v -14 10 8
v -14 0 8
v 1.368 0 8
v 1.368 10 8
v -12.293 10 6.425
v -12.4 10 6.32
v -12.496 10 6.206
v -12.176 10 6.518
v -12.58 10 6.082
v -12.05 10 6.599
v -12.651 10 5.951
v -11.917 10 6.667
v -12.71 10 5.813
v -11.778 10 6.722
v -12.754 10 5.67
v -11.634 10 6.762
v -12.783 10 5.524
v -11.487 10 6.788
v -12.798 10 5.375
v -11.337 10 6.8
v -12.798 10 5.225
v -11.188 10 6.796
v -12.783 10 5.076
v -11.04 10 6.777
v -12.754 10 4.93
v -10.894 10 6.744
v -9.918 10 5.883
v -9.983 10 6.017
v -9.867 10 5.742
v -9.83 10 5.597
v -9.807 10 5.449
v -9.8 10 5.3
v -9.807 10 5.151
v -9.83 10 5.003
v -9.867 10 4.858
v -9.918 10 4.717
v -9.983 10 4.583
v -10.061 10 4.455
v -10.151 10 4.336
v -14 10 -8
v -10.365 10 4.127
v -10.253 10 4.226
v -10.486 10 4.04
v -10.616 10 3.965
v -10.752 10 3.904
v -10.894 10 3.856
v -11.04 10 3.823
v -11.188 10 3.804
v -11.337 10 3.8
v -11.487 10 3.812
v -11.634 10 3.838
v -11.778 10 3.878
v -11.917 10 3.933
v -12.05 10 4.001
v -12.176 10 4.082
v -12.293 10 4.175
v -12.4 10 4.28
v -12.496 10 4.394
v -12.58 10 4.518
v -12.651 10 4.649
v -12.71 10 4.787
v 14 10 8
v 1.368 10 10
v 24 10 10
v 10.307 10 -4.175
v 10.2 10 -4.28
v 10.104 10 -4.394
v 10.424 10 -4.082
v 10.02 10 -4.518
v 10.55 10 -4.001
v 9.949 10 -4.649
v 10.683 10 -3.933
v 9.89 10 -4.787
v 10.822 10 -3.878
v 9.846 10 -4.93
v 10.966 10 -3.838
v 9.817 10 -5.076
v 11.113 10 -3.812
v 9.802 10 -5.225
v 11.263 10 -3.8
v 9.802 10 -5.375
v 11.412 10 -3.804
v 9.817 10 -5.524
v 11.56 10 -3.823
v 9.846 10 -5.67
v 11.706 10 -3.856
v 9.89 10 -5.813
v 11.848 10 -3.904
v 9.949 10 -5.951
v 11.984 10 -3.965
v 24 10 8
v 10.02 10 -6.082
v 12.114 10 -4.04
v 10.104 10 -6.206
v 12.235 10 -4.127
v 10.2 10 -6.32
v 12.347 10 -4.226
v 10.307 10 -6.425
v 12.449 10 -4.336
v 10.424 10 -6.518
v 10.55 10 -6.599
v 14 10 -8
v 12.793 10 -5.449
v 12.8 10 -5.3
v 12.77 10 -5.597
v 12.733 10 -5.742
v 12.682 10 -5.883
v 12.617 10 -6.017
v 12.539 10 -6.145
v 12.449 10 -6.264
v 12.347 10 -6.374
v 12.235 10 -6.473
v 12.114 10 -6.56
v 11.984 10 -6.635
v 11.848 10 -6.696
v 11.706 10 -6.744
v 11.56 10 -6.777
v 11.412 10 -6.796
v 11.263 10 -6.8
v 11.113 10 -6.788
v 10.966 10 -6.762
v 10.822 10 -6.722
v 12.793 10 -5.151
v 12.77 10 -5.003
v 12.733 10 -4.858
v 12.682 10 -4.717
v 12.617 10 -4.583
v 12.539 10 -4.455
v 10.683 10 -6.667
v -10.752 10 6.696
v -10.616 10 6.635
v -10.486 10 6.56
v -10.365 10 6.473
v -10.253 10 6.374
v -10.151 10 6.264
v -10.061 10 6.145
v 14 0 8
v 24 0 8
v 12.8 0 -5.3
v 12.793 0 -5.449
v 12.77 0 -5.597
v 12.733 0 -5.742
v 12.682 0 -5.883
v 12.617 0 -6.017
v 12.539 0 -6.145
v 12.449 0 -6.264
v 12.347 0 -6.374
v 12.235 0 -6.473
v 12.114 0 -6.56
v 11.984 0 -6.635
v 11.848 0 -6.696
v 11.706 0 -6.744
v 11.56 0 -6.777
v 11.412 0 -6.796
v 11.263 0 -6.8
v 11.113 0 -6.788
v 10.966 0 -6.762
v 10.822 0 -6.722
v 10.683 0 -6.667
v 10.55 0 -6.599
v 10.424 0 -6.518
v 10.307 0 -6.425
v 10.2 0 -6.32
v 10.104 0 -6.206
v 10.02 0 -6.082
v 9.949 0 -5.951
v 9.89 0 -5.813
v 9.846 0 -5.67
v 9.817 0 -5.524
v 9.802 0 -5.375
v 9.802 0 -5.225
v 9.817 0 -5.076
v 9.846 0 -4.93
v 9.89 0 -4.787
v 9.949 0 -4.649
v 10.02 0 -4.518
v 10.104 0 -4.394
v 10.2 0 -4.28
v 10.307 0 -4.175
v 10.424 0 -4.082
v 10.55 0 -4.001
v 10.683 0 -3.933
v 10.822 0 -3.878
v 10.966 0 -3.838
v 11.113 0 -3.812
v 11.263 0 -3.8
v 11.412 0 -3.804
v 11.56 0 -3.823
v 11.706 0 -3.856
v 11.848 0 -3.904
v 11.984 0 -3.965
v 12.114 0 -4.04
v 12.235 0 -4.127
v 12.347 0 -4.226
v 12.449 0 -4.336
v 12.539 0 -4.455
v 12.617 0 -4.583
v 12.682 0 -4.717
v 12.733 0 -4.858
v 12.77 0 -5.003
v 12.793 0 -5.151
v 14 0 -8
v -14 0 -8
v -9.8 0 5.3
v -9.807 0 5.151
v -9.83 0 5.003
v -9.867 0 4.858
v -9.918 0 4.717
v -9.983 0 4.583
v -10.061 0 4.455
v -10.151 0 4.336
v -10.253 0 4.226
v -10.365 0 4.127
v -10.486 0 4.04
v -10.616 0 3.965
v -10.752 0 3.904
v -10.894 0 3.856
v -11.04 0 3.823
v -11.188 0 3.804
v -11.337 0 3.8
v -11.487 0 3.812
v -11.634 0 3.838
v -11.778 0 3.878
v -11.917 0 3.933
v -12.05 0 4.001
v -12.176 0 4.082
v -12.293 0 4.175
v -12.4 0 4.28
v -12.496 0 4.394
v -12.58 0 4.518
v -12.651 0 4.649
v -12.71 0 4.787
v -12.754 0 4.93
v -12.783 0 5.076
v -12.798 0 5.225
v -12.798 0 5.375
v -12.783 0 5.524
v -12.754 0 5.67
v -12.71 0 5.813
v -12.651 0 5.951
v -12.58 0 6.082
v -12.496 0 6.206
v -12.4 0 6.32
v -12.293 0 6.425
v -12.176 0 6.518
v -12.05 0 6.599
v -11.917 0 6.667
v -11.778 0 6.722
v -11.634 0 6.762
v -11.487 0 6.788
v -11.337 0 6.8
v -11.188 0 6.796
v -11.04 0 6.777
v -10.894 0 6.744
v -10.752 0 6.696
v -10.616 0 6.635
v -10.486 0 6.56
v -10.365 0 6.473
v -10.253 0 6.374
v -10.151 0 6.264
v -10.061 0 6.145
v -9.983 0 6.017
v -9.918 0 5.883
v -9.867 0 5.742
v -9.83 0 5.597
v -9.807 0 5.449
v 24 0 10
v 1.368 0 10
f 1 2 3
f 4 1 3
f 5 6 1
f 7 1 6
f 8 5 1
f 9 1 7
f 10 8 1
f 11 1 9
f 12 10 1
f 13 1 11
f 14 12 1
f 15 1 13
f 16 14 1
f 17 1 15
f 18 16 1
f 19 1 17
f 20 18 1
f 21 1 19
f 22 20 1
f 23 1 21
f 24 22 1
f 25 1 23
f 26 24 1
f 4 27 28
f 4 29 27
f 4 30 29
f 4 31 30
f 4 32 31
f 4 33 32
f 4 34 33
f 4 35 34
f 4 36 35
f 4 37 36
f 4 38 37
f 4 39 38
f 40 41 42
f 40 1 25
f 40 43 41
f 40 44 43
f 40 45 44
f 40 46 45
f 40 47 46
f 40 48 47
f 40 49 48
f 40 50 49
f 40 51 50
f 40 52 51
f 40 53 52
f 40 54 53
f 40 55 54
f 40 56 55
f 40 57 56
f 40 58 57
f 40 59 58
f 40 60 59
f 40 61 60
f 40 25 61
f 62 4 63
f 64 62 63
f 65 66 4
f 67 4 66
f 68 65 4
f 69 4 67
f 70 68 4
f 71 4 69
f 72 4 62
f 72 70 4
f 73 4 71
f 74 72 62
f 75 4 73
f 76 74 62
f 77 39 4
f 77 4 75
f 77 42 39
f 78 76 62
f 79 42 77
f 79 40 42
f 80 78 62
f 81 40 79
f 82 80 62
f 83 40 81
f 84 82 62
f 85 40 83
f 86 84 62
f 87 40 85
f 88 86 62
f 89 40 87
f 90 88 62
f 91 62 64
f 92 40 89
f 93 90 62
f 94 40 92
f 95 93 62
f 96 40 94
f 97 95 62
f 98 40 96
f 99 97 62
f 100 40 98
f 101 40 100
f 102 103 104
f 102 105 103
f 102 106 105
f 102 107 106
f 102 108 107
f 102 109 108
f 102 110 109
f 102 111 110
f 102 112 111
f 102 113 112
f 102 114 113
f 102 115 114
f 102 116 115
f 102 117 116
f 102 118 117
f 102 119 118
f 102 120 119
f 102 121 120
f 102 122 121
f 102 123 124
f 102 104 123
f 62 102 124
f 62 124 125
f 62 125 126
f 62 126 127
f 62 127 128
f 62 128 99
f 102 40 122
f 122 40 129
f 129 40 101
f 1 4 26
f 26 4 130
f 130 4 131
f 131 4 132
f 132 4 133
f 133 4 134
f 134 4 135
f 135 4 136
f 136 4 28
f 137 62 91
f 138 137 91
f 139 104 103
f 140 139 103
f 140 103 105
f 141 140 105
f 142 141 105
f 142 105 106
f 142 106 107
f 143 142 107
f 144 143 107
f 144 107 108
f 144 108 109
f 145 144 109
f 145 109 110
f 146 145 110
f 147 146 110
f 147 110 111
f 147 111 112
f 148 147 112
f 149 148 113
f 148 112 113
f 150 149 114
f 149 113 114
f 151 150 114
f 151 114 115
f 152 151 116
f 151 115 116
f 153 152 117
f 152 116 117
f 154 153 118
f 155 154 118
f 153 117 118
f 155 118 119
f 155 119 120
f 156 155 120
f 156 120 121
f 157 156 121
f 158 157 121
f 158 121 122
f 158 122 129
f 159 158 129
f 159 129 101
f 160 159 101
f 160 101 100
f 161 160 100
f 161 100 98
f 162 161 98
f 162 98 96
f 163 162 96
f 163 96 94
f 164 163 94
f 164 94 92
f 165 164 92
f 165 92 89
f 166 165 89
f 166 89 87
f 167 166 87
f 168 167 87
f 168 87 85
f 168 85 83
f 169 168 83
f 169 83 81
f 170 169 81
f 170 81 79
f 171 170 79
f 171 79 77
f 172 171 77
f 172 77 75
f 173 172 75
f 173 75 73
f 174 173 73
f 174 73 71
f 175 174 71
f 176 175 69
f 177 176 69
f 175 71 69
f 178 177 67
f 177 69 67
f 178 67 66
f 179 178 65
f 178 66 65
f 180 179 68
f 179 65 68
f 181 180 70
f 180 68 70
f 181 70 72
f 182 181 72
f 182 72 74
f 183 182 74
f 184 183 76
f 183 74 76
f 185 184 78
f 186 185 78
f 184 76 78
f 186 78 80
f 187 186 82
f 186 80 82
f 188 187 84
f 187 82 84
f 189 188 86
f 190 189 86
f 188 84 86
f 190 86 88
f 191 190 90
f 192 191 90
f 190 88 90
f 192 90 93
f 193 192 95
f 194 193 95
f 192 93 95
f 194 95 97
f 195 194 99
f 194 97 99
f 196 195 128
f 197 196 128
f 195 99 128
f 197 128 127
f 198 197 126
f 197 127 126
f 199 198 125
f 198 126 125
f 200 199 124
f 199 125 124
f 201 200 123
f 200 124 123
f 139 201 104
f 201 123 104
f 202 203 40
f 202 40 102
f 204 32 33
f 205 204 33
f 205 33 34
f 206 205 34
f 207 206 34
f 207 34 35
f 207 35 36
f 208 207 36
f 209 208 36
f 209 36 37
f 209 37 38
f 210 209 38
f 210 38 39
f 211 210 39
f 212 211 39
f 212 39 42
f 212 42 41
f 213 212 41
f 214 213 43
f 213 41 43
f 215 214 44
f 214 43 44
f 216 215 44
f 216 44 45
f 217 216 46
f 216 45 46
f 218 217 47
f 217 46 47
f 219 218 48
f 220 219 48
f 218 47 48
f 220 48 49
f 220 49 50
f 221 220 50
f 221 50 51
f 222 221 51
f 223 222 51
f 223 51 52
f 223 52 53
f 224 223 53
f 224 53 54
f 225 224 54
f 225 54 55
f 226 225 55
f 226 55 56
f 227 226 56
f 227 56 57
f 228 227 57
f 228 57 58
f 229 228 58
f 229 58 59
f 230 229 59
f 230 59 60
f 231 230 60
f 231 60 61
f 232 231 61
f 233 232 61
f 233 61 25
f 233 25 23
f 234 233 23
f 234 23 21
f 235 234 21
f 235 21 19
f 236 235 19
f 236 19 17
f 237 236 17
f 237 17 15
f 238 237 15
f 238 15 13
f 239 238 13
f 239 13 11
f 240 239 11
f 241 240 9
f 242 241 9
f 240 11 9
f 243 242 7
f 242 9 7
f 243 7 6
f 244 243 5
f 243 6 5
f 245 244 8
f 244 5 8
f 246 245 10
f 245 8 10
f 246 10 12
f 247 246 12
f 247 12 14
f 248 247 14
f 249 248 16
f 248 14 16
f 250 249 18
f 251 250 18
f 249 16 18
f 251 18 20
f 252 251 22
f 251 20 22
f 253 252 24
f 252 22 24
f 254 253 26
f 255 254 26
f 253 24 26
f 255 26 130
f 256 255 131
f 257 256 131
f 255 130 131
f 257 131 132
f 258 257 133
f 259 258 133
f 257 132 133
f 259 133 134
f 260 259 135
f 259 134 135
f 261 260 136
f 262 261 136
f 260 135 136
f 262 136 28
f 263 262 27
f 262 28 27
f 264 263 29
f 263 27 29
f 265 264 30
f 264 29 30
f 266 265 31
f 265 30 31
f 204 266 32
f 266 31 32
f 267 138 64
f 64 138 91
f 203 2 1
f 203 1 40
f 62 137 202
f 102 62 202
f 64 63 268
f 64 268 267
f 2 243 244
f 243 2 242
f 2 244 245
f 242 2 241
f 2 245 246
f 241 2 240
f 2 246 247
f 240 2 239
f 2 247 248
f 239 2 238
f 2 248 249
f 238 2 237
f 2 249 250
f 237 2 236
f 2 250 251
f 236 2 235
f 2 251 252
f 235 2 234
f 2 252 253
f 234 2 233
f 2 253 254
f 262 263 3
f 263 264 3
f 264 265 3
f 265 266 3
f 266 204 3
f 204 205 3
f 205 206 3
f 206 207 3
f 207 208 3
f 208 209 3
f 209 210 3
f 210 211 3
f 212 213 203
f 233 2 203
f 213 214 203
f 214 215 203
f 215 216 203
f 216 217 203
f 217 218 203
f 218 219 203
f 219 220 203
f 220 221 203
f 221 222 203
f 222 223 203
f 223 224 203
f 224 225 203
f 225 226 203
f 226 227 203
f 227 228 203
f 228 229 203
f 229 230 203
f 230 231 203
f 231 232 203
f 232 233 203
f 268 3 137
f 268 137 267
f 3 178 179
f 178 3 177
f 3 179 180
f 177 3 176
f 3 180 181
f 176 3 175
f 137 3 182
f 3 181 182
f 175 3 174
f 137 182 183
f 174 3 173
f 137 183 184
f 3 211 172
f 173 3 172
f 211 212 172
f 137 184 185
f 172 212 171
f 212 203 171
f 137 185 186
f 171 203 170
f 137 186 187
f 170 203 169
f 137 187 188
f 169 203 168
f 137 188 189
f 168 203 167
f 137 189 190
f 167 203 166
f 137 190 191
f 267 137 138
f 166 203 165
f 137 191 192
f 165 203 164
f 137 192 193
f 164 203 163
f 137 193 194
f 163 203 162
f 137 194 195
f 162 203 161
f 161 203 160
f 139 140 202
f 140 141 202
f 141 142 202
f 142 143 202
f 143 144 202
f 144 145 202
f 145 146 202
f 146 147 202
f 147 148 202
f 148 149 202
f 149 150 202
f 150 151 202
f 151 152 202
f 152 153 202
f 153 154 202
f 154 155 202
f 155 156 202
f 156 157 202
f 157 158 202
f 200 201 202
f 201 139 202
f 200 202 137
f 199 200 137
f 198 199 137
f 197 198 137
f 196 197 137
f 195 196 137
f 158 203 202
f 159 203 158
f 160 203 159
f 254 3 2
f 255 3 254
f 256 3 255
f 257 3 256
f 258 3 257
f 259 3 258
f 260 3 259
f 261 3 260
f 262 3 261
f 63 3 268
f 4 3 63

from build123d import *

# Parameters (mm, degrees)
SKETCH1_W           = 28
SKETCH1_H           = 16
BOSS_EXTRUDE1_DEPTH = 10
CUT_EXTRUDE1_REACH  = 12
SKETCH2_R           = 1.5
SKETCH3_W           = 22.631801359
SKETCH3_H           = 10
BOSS_EXTRUDE2_DEPTH = 2


with BuildPart() as part:
    # Sketch1 → Boss-Extrude1 (new body)
    with BuildSketch(Plane(origin=(0, 0, 0), x_dir=(1, 0, 0), z_dir=(0, 1, 0))):
        Rectangle(SKETCH1_W, SKETCH1_H)
    extrude(amount=BOSS_EXTRUDE1_DEPTH)

    # Sketch2 → Cut-Extrude1 (cut, up to next)
    with BuildSketch(Plane(origin=(0, 10, 0), x_dir=(1, 0, 0), z_dir=(0, 1, 0)), mode=Mode.PRIVATE) as cut_extrude1_sk1:
        with Locations((-11.3, -5.3)):
            Circle(SKETCH2_R)
    cut_extrude1_tool1 = extrude(cut_extrude1_sk1.sketch, amount=-CUT_EXTRUDE1_REACH, mode=Mode.PRIVATE) & part.part
    add(cut_extrude1_tool1.solids().sort_by_distance((-11.3, 10, 5.3))[0], mode=Mode.SUBTRACT)
    # Sketch2 → Cut-Extrude1 (cut, up to next)
    with BuildSketch(Plane(origin=(0, 10, 0), x_dir=(1, 0, 0), z_dir=(0, 1, 0)), mode=Mode.PRIVATE) as cut_extrude1_sk2:
        with Locations((11.3, 5.3)):
            Circle(SKETCH2_R)
    cut_extrude1_tool2 = extrude(cut_extrude1_sk2.sketch, amount=-CUT_EXTRUDE1_REACH, mode=Mode.PRIVATE) & part.part
    add(cut_extrude1_tool2.solids().sort_by_distance((11.3, 10, -5.3))[0], mode=Mode.SUBTRACT)

    # Sketch3 → Boss-Extrude2 (add)
    with BuildSketch(Plane.XY.offset(8)):
        with Locations((12.68409932, 5)):
            Rectangle(SKETCH3_W, SKETCH3_H)
    extrude(amount=BOSS_EXTRUDE2_DEPTH)


solid = part.part
